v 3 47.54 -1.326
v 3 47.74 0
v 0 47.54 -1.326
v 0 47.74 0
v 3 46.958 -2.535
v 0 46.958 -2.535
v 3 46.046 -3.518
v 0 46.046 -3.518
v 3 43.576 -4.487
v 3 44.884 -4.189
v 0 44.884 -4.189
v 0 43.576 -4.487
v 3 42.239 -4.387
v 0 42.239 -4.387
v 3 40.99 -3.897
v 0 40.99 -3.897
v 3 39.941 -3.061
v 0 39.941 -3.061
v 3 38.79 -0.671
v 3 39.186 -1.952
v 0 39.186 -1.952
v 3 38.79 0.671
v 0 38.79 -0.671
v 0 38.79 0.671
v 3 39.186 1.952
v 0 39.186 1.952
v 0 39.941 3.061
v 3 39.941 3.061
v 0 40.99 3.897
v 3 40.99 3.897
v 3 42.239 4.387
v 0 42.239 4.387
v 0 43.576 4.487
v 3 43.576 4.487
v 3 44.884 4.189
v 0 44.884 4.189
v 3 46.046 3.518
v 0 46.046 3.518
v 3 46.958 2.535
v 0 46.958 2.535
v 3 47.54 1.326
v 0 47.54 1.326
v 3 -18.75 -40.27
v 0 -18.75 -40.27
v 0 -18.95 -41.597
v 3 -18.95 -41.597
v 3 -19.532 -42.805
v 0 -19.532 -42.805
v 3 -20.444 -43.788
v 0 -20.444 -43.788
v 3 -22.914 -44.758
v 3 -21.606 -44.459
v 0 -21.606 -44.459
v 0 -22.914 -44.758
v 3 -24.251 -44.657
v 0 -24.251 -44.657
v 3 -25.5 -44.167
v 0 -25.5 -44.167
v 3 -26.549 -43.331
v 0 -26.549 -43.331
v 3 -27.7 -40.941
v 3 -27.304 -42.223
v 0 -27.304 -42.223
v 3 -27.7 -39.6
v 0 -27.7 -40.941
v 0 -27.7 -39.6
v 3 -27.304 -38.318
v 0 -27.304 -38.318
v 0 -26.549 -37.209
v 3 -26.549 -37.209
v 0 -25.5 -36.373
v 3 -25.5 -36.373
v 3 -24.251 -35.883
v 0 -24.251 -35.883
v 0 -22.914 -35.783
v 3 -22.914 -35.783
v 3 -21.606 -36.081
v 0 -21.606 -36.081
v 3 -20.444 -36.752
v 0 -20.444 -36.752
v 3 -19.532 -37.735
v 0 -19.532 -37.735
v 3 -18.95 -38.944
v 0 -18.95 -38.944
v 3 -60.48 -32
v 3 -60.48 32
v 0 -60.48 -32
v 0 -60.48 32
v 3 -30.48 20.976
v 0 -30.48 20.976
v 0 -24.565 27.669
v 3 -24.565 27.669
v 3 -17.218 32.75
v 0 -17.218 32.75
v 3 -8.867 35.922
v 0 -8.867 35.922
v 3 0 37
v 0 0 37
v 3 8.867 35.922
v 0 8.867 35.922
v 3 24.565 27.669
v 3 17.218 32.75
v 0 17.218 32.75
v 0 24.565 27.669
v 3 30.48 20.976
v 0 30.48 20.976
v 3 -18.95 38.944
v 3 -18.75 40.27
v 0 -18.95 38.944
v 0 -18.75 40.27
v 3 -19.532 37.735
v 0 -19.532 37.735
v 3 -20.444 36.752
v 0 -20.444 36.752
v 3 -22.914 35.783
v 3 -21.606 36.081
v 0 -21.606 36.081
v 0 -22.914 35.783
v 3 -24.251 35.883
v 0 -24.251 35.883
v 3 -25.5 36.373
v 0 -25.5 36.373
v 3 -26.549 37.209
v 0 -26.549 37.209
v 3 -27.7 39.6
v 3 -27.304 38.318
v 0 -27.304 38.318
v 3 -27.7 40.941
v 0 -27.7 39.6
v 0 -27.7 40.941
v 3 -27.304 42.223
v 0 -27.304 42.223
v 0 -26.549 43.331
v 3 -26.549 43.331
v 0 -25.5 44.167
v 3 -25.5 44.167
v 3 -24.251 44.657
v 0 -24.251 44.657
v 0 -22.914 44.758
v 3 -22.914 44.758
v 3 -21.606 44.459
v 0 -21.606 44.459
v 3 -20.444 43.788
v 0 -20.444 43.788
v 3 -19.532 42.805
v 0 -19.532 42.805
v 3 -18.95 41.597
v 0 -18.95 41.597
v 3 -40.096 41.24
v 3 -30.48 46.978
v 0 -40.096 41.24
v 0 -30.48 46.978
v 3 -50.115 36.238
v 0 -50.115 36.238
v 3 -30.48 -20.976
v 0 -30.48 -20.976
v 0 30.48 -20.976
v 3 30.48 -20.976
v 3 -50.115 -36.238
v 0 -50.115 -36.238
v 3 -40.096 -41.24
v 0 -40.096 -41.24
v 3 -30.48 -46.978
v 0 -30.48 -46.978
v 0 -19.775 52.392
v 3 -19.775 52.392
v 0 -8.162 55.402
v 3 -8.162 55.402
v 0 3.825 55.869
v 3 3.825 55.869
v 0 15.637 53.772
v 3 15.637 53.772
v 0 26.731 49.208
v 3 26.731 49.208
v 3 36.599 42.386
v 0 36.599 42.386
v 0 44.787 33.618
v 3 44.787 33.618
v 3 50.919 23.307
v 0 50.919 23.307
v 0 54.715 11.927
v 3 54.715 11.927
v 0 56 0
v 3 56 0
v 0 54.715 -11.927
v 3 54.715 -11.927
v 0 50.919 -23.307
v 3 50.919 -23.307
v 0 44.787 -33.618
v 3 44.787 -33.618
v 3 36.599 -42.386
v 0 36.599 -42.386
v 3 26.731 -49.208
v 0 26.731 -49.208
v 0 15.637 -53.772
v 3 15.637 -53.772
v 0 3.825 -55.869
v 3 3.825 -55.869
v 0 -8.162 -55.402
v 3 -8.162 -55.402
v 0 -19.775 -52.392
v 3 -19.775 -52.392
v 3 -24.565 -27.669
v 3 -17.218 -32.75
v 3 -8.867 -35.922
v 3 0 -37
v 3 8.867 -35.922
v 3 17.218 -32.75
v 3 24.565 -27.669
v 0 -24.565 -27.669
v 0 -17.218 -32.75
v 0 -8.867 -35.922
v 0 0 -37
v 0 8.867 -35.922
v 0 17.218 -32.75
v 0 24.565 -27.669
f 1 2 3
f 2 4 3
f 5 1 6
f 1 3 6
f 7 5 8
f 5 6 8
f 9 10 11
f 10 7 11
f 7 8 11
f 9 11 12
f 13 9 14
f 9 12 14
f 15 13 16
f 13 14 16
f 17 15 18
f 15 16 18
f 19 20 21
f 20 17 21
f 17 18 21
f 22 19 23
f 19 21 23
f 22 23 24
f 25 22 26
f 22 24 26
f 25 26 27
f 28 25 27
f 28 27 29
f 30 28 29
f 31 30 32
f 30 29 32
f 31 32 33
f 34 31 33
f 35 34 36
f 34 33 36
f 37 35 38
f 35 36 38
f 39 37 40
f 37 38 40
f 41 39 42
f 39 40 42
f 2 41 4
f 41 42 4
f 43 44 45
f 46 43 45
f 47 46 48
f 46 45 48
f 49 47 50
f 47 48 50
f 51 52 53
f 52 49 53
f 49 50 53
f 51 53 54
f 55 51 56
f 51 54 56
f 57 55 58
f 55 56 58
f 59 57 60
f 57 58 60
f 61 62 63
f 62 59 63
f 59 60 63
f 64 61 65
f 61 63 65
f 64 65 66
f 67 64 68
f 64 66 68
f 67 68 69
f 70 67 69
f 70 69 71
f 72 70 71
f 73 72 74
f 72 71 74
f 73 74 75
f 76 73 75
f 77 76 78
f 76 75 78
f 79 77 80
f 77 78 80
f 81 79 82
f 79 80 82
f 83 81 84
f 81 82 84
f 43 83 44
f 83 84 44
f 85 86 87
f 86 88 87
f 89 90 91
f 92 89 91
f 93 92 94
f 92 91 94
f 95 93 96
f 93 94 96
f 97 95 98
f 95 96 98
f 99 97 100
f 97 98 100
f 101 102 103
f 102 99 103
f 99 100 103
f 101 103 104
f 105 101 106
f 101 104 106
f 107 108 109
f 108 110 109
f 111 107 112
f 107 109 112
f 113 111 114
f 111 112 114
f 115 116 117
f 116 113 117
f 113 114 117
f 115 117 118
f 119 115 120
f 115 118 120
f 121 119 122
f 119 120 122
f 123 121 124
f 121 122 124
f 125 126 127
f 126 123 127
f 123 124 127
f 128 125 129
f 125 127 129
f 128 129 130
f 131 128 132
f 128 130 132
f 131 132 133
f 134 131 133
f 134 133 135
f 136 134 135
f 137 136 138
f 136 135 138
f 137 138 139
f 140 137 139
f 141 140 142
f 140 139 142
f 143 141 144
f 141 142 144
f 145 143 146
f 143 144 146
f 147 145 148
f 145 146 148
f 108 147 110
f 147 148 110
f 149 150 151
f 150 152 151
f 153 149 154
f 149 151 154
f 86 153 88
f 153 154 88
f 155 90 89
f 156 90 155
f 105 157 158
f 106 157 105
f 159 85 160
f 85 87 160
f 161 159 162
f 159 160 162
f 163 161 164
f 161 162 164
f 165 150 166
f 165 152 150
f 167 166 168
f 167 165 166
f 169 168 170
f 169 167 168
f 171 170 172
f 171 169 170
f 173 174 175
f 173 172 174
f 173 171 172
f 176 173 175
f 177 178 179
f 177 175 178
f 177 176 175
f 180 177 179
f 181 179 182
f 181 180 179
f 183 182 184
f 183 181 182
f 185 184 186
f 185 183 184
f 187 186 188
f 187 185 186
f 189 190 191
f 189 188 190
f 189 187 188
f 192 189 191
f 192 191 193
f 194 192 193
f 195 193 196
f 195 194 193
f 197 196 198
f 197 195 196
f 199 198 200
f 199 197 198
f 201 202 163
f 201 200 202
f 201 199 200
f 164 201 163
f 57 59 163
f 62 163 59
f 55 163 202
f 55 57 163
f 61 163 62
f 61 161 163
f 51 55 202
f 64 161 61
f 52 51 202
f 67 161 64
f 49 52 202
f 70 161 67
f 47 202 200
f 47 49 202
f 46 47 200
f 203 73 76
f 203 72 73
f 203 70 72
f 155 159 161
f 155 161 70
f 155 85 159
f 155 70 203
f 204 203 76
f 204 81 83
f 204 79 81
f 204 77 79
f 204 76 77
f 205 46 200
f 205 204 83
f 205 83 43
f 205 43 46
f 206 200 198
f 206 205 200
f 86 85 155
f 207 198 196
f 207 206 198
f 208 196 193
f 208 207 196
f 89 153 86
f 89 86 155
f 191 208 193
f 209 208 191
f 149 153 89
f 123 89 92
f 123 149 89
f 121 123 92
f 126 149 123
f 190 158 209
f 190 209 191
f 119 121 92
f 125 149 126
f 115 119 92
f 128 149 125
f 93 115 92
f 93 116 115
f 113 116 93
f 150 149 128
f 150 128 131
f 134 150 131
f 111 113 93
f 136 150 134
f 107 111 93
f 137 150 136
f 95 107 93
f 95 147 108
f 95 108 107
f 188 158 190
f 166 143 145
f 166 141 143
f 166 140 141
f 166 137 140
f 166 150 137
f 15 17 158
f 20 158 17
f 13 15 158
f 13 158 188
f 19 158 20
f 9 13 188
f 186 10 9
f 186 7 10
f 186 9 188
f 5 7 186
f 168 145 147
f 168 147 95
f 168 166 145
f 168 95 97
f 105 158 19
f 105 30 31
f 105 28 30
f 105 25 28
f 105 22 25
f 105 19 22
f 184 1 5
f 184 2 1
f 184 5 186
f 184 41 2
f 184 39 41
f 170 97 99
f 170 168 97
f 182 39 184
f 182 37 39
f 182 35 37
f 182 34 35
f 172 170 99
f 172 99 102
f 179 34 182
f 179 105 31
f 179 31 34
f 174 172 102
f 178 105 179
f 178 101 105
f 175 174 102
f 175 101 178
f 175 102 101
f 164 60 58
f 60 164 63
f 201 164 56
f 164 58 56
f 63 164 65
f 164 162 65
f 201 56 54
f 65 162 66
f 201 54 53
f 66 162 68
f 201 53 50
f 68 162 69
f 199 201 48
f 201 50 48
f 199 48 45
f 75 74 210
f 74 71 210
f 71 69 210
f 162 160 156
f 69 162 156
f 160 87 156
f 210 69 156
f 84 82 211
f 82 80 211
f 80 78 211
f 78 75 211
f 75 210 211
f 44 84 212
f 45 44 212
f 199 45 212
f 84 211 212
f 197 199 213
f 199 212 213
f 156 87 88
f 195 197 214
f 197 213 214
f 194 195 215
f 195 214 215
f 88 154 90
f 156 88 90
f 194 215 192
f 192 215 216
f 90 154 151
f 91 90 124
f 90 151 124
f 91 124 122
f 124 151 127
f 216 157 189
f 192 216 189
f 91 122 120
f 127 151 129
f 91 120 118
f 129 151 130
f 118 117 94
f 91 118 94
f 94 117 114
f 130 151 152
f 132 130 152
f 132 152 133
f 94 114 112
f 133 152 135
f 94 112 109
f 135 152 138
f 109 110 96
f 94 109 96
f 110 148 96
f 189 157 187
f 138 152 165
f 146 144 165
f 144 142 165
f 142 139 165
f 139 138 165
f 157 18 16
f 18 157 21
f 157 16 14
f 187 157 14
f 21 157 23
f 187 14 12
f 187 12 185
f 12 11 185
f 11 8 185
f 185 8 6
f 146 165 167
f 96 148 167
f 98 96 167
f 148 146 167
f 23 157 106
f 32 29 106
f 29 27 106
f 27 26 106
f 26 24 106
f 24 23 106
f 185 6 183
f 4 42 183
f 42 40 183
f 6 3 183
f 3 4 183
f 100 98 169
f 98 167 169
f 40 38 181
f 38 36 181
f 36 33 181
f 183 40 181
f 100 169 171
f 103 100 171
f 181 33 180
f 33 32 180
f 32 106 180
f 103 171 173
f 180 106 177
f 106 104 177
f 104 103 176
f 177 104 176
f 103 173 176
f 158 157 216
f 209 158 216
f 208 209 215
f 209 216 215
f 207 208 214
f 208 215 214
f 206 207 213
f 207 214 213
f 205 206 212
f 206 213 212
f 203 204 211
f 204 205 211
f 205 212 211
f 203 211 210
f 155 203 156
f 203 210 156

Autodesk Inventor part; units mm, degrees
ref_plane "YZ Plane" through (0, 0, 0) normal (1, 0, 0) x (0, 1, 0)
ref_plane "XZ Plane" through (0, 0, 0) normal (0, 1, 0) x (-1, 0, 0)
ref_plane "XY Plane" through (0, 0, 0) normal (0, 0, 1) x (1, 0, 0)
sketch "Sketch1" plane through (0, 0, 0) normal (1, 0, 0) x (0, 1, 0)
  line L0 (30.48, -20.9755) -> (30.48, 20.9755)
  line L1 (-30.48, 20.9755) -> (-30.48, -20.9755)
  arc A0 (30.48, 20.9755) -> (-30.48, 20.9755) centre (0, 0) ccw
  arc A1 (-30.48, -20.9755) -> (30.48, -20.9755) centre (0, 0) ccw
  arc A2 (-30.48, -46.9784) -> (-30.48, 46.9784) centre (0, 0) ccw
  line L2 (-60.48, 32) -> (-60.48, -32)
  arc A3 (-60.48, 32) -> (-30.48, 46.9784) centre (-111.7897, 172.2999) ccw
  arc A4 (-30.48, -46.9784) -> (-60.48, -32) centre (-111.7897, -172.2999) ccw
  line L3 (56, 0) -> (0, 0) construction
  line L4 (0, 0) -> (-28, 48.4974) construction
  line L5 (0, 0) -> (-28, -48.4974) construction
  line L6 (30.48, 0) -> (56, 0) construction
  line L7 (-18.5, -32.0429) -> (-28, -48.4974) construction
  line L8 (-28, 48.4974) -> (-18.5, 32.0429) construction
  circle A5 centre (43.24, 0) radius 4.5
  circle A6 centre (-23.25, -40.2702) radius 4.5
  circle A7 centre (-23.25, 40.2702) radius 4.5
  point P0 (-60.48, 0)
  point P1 (-30.48, 0)
  dimension "d1" = 60.96
  dimension "d2" = 30.48
  dimension "d3" = 37
  dimension "d4" = 37
  dimension "d5" = 19
  dimension "d6" = 64
  dimension "d7" = 120
  dimension "d8" = 120
  dimension "d9" = 9
  dimension "d10" = 9
  dimension "d11" = 9
  dimension "d14" = 30
extrude "Extrusion1" add sketch "Sketch1" along normal blind 3
properties part number "battlebotmotorbracetemp"
